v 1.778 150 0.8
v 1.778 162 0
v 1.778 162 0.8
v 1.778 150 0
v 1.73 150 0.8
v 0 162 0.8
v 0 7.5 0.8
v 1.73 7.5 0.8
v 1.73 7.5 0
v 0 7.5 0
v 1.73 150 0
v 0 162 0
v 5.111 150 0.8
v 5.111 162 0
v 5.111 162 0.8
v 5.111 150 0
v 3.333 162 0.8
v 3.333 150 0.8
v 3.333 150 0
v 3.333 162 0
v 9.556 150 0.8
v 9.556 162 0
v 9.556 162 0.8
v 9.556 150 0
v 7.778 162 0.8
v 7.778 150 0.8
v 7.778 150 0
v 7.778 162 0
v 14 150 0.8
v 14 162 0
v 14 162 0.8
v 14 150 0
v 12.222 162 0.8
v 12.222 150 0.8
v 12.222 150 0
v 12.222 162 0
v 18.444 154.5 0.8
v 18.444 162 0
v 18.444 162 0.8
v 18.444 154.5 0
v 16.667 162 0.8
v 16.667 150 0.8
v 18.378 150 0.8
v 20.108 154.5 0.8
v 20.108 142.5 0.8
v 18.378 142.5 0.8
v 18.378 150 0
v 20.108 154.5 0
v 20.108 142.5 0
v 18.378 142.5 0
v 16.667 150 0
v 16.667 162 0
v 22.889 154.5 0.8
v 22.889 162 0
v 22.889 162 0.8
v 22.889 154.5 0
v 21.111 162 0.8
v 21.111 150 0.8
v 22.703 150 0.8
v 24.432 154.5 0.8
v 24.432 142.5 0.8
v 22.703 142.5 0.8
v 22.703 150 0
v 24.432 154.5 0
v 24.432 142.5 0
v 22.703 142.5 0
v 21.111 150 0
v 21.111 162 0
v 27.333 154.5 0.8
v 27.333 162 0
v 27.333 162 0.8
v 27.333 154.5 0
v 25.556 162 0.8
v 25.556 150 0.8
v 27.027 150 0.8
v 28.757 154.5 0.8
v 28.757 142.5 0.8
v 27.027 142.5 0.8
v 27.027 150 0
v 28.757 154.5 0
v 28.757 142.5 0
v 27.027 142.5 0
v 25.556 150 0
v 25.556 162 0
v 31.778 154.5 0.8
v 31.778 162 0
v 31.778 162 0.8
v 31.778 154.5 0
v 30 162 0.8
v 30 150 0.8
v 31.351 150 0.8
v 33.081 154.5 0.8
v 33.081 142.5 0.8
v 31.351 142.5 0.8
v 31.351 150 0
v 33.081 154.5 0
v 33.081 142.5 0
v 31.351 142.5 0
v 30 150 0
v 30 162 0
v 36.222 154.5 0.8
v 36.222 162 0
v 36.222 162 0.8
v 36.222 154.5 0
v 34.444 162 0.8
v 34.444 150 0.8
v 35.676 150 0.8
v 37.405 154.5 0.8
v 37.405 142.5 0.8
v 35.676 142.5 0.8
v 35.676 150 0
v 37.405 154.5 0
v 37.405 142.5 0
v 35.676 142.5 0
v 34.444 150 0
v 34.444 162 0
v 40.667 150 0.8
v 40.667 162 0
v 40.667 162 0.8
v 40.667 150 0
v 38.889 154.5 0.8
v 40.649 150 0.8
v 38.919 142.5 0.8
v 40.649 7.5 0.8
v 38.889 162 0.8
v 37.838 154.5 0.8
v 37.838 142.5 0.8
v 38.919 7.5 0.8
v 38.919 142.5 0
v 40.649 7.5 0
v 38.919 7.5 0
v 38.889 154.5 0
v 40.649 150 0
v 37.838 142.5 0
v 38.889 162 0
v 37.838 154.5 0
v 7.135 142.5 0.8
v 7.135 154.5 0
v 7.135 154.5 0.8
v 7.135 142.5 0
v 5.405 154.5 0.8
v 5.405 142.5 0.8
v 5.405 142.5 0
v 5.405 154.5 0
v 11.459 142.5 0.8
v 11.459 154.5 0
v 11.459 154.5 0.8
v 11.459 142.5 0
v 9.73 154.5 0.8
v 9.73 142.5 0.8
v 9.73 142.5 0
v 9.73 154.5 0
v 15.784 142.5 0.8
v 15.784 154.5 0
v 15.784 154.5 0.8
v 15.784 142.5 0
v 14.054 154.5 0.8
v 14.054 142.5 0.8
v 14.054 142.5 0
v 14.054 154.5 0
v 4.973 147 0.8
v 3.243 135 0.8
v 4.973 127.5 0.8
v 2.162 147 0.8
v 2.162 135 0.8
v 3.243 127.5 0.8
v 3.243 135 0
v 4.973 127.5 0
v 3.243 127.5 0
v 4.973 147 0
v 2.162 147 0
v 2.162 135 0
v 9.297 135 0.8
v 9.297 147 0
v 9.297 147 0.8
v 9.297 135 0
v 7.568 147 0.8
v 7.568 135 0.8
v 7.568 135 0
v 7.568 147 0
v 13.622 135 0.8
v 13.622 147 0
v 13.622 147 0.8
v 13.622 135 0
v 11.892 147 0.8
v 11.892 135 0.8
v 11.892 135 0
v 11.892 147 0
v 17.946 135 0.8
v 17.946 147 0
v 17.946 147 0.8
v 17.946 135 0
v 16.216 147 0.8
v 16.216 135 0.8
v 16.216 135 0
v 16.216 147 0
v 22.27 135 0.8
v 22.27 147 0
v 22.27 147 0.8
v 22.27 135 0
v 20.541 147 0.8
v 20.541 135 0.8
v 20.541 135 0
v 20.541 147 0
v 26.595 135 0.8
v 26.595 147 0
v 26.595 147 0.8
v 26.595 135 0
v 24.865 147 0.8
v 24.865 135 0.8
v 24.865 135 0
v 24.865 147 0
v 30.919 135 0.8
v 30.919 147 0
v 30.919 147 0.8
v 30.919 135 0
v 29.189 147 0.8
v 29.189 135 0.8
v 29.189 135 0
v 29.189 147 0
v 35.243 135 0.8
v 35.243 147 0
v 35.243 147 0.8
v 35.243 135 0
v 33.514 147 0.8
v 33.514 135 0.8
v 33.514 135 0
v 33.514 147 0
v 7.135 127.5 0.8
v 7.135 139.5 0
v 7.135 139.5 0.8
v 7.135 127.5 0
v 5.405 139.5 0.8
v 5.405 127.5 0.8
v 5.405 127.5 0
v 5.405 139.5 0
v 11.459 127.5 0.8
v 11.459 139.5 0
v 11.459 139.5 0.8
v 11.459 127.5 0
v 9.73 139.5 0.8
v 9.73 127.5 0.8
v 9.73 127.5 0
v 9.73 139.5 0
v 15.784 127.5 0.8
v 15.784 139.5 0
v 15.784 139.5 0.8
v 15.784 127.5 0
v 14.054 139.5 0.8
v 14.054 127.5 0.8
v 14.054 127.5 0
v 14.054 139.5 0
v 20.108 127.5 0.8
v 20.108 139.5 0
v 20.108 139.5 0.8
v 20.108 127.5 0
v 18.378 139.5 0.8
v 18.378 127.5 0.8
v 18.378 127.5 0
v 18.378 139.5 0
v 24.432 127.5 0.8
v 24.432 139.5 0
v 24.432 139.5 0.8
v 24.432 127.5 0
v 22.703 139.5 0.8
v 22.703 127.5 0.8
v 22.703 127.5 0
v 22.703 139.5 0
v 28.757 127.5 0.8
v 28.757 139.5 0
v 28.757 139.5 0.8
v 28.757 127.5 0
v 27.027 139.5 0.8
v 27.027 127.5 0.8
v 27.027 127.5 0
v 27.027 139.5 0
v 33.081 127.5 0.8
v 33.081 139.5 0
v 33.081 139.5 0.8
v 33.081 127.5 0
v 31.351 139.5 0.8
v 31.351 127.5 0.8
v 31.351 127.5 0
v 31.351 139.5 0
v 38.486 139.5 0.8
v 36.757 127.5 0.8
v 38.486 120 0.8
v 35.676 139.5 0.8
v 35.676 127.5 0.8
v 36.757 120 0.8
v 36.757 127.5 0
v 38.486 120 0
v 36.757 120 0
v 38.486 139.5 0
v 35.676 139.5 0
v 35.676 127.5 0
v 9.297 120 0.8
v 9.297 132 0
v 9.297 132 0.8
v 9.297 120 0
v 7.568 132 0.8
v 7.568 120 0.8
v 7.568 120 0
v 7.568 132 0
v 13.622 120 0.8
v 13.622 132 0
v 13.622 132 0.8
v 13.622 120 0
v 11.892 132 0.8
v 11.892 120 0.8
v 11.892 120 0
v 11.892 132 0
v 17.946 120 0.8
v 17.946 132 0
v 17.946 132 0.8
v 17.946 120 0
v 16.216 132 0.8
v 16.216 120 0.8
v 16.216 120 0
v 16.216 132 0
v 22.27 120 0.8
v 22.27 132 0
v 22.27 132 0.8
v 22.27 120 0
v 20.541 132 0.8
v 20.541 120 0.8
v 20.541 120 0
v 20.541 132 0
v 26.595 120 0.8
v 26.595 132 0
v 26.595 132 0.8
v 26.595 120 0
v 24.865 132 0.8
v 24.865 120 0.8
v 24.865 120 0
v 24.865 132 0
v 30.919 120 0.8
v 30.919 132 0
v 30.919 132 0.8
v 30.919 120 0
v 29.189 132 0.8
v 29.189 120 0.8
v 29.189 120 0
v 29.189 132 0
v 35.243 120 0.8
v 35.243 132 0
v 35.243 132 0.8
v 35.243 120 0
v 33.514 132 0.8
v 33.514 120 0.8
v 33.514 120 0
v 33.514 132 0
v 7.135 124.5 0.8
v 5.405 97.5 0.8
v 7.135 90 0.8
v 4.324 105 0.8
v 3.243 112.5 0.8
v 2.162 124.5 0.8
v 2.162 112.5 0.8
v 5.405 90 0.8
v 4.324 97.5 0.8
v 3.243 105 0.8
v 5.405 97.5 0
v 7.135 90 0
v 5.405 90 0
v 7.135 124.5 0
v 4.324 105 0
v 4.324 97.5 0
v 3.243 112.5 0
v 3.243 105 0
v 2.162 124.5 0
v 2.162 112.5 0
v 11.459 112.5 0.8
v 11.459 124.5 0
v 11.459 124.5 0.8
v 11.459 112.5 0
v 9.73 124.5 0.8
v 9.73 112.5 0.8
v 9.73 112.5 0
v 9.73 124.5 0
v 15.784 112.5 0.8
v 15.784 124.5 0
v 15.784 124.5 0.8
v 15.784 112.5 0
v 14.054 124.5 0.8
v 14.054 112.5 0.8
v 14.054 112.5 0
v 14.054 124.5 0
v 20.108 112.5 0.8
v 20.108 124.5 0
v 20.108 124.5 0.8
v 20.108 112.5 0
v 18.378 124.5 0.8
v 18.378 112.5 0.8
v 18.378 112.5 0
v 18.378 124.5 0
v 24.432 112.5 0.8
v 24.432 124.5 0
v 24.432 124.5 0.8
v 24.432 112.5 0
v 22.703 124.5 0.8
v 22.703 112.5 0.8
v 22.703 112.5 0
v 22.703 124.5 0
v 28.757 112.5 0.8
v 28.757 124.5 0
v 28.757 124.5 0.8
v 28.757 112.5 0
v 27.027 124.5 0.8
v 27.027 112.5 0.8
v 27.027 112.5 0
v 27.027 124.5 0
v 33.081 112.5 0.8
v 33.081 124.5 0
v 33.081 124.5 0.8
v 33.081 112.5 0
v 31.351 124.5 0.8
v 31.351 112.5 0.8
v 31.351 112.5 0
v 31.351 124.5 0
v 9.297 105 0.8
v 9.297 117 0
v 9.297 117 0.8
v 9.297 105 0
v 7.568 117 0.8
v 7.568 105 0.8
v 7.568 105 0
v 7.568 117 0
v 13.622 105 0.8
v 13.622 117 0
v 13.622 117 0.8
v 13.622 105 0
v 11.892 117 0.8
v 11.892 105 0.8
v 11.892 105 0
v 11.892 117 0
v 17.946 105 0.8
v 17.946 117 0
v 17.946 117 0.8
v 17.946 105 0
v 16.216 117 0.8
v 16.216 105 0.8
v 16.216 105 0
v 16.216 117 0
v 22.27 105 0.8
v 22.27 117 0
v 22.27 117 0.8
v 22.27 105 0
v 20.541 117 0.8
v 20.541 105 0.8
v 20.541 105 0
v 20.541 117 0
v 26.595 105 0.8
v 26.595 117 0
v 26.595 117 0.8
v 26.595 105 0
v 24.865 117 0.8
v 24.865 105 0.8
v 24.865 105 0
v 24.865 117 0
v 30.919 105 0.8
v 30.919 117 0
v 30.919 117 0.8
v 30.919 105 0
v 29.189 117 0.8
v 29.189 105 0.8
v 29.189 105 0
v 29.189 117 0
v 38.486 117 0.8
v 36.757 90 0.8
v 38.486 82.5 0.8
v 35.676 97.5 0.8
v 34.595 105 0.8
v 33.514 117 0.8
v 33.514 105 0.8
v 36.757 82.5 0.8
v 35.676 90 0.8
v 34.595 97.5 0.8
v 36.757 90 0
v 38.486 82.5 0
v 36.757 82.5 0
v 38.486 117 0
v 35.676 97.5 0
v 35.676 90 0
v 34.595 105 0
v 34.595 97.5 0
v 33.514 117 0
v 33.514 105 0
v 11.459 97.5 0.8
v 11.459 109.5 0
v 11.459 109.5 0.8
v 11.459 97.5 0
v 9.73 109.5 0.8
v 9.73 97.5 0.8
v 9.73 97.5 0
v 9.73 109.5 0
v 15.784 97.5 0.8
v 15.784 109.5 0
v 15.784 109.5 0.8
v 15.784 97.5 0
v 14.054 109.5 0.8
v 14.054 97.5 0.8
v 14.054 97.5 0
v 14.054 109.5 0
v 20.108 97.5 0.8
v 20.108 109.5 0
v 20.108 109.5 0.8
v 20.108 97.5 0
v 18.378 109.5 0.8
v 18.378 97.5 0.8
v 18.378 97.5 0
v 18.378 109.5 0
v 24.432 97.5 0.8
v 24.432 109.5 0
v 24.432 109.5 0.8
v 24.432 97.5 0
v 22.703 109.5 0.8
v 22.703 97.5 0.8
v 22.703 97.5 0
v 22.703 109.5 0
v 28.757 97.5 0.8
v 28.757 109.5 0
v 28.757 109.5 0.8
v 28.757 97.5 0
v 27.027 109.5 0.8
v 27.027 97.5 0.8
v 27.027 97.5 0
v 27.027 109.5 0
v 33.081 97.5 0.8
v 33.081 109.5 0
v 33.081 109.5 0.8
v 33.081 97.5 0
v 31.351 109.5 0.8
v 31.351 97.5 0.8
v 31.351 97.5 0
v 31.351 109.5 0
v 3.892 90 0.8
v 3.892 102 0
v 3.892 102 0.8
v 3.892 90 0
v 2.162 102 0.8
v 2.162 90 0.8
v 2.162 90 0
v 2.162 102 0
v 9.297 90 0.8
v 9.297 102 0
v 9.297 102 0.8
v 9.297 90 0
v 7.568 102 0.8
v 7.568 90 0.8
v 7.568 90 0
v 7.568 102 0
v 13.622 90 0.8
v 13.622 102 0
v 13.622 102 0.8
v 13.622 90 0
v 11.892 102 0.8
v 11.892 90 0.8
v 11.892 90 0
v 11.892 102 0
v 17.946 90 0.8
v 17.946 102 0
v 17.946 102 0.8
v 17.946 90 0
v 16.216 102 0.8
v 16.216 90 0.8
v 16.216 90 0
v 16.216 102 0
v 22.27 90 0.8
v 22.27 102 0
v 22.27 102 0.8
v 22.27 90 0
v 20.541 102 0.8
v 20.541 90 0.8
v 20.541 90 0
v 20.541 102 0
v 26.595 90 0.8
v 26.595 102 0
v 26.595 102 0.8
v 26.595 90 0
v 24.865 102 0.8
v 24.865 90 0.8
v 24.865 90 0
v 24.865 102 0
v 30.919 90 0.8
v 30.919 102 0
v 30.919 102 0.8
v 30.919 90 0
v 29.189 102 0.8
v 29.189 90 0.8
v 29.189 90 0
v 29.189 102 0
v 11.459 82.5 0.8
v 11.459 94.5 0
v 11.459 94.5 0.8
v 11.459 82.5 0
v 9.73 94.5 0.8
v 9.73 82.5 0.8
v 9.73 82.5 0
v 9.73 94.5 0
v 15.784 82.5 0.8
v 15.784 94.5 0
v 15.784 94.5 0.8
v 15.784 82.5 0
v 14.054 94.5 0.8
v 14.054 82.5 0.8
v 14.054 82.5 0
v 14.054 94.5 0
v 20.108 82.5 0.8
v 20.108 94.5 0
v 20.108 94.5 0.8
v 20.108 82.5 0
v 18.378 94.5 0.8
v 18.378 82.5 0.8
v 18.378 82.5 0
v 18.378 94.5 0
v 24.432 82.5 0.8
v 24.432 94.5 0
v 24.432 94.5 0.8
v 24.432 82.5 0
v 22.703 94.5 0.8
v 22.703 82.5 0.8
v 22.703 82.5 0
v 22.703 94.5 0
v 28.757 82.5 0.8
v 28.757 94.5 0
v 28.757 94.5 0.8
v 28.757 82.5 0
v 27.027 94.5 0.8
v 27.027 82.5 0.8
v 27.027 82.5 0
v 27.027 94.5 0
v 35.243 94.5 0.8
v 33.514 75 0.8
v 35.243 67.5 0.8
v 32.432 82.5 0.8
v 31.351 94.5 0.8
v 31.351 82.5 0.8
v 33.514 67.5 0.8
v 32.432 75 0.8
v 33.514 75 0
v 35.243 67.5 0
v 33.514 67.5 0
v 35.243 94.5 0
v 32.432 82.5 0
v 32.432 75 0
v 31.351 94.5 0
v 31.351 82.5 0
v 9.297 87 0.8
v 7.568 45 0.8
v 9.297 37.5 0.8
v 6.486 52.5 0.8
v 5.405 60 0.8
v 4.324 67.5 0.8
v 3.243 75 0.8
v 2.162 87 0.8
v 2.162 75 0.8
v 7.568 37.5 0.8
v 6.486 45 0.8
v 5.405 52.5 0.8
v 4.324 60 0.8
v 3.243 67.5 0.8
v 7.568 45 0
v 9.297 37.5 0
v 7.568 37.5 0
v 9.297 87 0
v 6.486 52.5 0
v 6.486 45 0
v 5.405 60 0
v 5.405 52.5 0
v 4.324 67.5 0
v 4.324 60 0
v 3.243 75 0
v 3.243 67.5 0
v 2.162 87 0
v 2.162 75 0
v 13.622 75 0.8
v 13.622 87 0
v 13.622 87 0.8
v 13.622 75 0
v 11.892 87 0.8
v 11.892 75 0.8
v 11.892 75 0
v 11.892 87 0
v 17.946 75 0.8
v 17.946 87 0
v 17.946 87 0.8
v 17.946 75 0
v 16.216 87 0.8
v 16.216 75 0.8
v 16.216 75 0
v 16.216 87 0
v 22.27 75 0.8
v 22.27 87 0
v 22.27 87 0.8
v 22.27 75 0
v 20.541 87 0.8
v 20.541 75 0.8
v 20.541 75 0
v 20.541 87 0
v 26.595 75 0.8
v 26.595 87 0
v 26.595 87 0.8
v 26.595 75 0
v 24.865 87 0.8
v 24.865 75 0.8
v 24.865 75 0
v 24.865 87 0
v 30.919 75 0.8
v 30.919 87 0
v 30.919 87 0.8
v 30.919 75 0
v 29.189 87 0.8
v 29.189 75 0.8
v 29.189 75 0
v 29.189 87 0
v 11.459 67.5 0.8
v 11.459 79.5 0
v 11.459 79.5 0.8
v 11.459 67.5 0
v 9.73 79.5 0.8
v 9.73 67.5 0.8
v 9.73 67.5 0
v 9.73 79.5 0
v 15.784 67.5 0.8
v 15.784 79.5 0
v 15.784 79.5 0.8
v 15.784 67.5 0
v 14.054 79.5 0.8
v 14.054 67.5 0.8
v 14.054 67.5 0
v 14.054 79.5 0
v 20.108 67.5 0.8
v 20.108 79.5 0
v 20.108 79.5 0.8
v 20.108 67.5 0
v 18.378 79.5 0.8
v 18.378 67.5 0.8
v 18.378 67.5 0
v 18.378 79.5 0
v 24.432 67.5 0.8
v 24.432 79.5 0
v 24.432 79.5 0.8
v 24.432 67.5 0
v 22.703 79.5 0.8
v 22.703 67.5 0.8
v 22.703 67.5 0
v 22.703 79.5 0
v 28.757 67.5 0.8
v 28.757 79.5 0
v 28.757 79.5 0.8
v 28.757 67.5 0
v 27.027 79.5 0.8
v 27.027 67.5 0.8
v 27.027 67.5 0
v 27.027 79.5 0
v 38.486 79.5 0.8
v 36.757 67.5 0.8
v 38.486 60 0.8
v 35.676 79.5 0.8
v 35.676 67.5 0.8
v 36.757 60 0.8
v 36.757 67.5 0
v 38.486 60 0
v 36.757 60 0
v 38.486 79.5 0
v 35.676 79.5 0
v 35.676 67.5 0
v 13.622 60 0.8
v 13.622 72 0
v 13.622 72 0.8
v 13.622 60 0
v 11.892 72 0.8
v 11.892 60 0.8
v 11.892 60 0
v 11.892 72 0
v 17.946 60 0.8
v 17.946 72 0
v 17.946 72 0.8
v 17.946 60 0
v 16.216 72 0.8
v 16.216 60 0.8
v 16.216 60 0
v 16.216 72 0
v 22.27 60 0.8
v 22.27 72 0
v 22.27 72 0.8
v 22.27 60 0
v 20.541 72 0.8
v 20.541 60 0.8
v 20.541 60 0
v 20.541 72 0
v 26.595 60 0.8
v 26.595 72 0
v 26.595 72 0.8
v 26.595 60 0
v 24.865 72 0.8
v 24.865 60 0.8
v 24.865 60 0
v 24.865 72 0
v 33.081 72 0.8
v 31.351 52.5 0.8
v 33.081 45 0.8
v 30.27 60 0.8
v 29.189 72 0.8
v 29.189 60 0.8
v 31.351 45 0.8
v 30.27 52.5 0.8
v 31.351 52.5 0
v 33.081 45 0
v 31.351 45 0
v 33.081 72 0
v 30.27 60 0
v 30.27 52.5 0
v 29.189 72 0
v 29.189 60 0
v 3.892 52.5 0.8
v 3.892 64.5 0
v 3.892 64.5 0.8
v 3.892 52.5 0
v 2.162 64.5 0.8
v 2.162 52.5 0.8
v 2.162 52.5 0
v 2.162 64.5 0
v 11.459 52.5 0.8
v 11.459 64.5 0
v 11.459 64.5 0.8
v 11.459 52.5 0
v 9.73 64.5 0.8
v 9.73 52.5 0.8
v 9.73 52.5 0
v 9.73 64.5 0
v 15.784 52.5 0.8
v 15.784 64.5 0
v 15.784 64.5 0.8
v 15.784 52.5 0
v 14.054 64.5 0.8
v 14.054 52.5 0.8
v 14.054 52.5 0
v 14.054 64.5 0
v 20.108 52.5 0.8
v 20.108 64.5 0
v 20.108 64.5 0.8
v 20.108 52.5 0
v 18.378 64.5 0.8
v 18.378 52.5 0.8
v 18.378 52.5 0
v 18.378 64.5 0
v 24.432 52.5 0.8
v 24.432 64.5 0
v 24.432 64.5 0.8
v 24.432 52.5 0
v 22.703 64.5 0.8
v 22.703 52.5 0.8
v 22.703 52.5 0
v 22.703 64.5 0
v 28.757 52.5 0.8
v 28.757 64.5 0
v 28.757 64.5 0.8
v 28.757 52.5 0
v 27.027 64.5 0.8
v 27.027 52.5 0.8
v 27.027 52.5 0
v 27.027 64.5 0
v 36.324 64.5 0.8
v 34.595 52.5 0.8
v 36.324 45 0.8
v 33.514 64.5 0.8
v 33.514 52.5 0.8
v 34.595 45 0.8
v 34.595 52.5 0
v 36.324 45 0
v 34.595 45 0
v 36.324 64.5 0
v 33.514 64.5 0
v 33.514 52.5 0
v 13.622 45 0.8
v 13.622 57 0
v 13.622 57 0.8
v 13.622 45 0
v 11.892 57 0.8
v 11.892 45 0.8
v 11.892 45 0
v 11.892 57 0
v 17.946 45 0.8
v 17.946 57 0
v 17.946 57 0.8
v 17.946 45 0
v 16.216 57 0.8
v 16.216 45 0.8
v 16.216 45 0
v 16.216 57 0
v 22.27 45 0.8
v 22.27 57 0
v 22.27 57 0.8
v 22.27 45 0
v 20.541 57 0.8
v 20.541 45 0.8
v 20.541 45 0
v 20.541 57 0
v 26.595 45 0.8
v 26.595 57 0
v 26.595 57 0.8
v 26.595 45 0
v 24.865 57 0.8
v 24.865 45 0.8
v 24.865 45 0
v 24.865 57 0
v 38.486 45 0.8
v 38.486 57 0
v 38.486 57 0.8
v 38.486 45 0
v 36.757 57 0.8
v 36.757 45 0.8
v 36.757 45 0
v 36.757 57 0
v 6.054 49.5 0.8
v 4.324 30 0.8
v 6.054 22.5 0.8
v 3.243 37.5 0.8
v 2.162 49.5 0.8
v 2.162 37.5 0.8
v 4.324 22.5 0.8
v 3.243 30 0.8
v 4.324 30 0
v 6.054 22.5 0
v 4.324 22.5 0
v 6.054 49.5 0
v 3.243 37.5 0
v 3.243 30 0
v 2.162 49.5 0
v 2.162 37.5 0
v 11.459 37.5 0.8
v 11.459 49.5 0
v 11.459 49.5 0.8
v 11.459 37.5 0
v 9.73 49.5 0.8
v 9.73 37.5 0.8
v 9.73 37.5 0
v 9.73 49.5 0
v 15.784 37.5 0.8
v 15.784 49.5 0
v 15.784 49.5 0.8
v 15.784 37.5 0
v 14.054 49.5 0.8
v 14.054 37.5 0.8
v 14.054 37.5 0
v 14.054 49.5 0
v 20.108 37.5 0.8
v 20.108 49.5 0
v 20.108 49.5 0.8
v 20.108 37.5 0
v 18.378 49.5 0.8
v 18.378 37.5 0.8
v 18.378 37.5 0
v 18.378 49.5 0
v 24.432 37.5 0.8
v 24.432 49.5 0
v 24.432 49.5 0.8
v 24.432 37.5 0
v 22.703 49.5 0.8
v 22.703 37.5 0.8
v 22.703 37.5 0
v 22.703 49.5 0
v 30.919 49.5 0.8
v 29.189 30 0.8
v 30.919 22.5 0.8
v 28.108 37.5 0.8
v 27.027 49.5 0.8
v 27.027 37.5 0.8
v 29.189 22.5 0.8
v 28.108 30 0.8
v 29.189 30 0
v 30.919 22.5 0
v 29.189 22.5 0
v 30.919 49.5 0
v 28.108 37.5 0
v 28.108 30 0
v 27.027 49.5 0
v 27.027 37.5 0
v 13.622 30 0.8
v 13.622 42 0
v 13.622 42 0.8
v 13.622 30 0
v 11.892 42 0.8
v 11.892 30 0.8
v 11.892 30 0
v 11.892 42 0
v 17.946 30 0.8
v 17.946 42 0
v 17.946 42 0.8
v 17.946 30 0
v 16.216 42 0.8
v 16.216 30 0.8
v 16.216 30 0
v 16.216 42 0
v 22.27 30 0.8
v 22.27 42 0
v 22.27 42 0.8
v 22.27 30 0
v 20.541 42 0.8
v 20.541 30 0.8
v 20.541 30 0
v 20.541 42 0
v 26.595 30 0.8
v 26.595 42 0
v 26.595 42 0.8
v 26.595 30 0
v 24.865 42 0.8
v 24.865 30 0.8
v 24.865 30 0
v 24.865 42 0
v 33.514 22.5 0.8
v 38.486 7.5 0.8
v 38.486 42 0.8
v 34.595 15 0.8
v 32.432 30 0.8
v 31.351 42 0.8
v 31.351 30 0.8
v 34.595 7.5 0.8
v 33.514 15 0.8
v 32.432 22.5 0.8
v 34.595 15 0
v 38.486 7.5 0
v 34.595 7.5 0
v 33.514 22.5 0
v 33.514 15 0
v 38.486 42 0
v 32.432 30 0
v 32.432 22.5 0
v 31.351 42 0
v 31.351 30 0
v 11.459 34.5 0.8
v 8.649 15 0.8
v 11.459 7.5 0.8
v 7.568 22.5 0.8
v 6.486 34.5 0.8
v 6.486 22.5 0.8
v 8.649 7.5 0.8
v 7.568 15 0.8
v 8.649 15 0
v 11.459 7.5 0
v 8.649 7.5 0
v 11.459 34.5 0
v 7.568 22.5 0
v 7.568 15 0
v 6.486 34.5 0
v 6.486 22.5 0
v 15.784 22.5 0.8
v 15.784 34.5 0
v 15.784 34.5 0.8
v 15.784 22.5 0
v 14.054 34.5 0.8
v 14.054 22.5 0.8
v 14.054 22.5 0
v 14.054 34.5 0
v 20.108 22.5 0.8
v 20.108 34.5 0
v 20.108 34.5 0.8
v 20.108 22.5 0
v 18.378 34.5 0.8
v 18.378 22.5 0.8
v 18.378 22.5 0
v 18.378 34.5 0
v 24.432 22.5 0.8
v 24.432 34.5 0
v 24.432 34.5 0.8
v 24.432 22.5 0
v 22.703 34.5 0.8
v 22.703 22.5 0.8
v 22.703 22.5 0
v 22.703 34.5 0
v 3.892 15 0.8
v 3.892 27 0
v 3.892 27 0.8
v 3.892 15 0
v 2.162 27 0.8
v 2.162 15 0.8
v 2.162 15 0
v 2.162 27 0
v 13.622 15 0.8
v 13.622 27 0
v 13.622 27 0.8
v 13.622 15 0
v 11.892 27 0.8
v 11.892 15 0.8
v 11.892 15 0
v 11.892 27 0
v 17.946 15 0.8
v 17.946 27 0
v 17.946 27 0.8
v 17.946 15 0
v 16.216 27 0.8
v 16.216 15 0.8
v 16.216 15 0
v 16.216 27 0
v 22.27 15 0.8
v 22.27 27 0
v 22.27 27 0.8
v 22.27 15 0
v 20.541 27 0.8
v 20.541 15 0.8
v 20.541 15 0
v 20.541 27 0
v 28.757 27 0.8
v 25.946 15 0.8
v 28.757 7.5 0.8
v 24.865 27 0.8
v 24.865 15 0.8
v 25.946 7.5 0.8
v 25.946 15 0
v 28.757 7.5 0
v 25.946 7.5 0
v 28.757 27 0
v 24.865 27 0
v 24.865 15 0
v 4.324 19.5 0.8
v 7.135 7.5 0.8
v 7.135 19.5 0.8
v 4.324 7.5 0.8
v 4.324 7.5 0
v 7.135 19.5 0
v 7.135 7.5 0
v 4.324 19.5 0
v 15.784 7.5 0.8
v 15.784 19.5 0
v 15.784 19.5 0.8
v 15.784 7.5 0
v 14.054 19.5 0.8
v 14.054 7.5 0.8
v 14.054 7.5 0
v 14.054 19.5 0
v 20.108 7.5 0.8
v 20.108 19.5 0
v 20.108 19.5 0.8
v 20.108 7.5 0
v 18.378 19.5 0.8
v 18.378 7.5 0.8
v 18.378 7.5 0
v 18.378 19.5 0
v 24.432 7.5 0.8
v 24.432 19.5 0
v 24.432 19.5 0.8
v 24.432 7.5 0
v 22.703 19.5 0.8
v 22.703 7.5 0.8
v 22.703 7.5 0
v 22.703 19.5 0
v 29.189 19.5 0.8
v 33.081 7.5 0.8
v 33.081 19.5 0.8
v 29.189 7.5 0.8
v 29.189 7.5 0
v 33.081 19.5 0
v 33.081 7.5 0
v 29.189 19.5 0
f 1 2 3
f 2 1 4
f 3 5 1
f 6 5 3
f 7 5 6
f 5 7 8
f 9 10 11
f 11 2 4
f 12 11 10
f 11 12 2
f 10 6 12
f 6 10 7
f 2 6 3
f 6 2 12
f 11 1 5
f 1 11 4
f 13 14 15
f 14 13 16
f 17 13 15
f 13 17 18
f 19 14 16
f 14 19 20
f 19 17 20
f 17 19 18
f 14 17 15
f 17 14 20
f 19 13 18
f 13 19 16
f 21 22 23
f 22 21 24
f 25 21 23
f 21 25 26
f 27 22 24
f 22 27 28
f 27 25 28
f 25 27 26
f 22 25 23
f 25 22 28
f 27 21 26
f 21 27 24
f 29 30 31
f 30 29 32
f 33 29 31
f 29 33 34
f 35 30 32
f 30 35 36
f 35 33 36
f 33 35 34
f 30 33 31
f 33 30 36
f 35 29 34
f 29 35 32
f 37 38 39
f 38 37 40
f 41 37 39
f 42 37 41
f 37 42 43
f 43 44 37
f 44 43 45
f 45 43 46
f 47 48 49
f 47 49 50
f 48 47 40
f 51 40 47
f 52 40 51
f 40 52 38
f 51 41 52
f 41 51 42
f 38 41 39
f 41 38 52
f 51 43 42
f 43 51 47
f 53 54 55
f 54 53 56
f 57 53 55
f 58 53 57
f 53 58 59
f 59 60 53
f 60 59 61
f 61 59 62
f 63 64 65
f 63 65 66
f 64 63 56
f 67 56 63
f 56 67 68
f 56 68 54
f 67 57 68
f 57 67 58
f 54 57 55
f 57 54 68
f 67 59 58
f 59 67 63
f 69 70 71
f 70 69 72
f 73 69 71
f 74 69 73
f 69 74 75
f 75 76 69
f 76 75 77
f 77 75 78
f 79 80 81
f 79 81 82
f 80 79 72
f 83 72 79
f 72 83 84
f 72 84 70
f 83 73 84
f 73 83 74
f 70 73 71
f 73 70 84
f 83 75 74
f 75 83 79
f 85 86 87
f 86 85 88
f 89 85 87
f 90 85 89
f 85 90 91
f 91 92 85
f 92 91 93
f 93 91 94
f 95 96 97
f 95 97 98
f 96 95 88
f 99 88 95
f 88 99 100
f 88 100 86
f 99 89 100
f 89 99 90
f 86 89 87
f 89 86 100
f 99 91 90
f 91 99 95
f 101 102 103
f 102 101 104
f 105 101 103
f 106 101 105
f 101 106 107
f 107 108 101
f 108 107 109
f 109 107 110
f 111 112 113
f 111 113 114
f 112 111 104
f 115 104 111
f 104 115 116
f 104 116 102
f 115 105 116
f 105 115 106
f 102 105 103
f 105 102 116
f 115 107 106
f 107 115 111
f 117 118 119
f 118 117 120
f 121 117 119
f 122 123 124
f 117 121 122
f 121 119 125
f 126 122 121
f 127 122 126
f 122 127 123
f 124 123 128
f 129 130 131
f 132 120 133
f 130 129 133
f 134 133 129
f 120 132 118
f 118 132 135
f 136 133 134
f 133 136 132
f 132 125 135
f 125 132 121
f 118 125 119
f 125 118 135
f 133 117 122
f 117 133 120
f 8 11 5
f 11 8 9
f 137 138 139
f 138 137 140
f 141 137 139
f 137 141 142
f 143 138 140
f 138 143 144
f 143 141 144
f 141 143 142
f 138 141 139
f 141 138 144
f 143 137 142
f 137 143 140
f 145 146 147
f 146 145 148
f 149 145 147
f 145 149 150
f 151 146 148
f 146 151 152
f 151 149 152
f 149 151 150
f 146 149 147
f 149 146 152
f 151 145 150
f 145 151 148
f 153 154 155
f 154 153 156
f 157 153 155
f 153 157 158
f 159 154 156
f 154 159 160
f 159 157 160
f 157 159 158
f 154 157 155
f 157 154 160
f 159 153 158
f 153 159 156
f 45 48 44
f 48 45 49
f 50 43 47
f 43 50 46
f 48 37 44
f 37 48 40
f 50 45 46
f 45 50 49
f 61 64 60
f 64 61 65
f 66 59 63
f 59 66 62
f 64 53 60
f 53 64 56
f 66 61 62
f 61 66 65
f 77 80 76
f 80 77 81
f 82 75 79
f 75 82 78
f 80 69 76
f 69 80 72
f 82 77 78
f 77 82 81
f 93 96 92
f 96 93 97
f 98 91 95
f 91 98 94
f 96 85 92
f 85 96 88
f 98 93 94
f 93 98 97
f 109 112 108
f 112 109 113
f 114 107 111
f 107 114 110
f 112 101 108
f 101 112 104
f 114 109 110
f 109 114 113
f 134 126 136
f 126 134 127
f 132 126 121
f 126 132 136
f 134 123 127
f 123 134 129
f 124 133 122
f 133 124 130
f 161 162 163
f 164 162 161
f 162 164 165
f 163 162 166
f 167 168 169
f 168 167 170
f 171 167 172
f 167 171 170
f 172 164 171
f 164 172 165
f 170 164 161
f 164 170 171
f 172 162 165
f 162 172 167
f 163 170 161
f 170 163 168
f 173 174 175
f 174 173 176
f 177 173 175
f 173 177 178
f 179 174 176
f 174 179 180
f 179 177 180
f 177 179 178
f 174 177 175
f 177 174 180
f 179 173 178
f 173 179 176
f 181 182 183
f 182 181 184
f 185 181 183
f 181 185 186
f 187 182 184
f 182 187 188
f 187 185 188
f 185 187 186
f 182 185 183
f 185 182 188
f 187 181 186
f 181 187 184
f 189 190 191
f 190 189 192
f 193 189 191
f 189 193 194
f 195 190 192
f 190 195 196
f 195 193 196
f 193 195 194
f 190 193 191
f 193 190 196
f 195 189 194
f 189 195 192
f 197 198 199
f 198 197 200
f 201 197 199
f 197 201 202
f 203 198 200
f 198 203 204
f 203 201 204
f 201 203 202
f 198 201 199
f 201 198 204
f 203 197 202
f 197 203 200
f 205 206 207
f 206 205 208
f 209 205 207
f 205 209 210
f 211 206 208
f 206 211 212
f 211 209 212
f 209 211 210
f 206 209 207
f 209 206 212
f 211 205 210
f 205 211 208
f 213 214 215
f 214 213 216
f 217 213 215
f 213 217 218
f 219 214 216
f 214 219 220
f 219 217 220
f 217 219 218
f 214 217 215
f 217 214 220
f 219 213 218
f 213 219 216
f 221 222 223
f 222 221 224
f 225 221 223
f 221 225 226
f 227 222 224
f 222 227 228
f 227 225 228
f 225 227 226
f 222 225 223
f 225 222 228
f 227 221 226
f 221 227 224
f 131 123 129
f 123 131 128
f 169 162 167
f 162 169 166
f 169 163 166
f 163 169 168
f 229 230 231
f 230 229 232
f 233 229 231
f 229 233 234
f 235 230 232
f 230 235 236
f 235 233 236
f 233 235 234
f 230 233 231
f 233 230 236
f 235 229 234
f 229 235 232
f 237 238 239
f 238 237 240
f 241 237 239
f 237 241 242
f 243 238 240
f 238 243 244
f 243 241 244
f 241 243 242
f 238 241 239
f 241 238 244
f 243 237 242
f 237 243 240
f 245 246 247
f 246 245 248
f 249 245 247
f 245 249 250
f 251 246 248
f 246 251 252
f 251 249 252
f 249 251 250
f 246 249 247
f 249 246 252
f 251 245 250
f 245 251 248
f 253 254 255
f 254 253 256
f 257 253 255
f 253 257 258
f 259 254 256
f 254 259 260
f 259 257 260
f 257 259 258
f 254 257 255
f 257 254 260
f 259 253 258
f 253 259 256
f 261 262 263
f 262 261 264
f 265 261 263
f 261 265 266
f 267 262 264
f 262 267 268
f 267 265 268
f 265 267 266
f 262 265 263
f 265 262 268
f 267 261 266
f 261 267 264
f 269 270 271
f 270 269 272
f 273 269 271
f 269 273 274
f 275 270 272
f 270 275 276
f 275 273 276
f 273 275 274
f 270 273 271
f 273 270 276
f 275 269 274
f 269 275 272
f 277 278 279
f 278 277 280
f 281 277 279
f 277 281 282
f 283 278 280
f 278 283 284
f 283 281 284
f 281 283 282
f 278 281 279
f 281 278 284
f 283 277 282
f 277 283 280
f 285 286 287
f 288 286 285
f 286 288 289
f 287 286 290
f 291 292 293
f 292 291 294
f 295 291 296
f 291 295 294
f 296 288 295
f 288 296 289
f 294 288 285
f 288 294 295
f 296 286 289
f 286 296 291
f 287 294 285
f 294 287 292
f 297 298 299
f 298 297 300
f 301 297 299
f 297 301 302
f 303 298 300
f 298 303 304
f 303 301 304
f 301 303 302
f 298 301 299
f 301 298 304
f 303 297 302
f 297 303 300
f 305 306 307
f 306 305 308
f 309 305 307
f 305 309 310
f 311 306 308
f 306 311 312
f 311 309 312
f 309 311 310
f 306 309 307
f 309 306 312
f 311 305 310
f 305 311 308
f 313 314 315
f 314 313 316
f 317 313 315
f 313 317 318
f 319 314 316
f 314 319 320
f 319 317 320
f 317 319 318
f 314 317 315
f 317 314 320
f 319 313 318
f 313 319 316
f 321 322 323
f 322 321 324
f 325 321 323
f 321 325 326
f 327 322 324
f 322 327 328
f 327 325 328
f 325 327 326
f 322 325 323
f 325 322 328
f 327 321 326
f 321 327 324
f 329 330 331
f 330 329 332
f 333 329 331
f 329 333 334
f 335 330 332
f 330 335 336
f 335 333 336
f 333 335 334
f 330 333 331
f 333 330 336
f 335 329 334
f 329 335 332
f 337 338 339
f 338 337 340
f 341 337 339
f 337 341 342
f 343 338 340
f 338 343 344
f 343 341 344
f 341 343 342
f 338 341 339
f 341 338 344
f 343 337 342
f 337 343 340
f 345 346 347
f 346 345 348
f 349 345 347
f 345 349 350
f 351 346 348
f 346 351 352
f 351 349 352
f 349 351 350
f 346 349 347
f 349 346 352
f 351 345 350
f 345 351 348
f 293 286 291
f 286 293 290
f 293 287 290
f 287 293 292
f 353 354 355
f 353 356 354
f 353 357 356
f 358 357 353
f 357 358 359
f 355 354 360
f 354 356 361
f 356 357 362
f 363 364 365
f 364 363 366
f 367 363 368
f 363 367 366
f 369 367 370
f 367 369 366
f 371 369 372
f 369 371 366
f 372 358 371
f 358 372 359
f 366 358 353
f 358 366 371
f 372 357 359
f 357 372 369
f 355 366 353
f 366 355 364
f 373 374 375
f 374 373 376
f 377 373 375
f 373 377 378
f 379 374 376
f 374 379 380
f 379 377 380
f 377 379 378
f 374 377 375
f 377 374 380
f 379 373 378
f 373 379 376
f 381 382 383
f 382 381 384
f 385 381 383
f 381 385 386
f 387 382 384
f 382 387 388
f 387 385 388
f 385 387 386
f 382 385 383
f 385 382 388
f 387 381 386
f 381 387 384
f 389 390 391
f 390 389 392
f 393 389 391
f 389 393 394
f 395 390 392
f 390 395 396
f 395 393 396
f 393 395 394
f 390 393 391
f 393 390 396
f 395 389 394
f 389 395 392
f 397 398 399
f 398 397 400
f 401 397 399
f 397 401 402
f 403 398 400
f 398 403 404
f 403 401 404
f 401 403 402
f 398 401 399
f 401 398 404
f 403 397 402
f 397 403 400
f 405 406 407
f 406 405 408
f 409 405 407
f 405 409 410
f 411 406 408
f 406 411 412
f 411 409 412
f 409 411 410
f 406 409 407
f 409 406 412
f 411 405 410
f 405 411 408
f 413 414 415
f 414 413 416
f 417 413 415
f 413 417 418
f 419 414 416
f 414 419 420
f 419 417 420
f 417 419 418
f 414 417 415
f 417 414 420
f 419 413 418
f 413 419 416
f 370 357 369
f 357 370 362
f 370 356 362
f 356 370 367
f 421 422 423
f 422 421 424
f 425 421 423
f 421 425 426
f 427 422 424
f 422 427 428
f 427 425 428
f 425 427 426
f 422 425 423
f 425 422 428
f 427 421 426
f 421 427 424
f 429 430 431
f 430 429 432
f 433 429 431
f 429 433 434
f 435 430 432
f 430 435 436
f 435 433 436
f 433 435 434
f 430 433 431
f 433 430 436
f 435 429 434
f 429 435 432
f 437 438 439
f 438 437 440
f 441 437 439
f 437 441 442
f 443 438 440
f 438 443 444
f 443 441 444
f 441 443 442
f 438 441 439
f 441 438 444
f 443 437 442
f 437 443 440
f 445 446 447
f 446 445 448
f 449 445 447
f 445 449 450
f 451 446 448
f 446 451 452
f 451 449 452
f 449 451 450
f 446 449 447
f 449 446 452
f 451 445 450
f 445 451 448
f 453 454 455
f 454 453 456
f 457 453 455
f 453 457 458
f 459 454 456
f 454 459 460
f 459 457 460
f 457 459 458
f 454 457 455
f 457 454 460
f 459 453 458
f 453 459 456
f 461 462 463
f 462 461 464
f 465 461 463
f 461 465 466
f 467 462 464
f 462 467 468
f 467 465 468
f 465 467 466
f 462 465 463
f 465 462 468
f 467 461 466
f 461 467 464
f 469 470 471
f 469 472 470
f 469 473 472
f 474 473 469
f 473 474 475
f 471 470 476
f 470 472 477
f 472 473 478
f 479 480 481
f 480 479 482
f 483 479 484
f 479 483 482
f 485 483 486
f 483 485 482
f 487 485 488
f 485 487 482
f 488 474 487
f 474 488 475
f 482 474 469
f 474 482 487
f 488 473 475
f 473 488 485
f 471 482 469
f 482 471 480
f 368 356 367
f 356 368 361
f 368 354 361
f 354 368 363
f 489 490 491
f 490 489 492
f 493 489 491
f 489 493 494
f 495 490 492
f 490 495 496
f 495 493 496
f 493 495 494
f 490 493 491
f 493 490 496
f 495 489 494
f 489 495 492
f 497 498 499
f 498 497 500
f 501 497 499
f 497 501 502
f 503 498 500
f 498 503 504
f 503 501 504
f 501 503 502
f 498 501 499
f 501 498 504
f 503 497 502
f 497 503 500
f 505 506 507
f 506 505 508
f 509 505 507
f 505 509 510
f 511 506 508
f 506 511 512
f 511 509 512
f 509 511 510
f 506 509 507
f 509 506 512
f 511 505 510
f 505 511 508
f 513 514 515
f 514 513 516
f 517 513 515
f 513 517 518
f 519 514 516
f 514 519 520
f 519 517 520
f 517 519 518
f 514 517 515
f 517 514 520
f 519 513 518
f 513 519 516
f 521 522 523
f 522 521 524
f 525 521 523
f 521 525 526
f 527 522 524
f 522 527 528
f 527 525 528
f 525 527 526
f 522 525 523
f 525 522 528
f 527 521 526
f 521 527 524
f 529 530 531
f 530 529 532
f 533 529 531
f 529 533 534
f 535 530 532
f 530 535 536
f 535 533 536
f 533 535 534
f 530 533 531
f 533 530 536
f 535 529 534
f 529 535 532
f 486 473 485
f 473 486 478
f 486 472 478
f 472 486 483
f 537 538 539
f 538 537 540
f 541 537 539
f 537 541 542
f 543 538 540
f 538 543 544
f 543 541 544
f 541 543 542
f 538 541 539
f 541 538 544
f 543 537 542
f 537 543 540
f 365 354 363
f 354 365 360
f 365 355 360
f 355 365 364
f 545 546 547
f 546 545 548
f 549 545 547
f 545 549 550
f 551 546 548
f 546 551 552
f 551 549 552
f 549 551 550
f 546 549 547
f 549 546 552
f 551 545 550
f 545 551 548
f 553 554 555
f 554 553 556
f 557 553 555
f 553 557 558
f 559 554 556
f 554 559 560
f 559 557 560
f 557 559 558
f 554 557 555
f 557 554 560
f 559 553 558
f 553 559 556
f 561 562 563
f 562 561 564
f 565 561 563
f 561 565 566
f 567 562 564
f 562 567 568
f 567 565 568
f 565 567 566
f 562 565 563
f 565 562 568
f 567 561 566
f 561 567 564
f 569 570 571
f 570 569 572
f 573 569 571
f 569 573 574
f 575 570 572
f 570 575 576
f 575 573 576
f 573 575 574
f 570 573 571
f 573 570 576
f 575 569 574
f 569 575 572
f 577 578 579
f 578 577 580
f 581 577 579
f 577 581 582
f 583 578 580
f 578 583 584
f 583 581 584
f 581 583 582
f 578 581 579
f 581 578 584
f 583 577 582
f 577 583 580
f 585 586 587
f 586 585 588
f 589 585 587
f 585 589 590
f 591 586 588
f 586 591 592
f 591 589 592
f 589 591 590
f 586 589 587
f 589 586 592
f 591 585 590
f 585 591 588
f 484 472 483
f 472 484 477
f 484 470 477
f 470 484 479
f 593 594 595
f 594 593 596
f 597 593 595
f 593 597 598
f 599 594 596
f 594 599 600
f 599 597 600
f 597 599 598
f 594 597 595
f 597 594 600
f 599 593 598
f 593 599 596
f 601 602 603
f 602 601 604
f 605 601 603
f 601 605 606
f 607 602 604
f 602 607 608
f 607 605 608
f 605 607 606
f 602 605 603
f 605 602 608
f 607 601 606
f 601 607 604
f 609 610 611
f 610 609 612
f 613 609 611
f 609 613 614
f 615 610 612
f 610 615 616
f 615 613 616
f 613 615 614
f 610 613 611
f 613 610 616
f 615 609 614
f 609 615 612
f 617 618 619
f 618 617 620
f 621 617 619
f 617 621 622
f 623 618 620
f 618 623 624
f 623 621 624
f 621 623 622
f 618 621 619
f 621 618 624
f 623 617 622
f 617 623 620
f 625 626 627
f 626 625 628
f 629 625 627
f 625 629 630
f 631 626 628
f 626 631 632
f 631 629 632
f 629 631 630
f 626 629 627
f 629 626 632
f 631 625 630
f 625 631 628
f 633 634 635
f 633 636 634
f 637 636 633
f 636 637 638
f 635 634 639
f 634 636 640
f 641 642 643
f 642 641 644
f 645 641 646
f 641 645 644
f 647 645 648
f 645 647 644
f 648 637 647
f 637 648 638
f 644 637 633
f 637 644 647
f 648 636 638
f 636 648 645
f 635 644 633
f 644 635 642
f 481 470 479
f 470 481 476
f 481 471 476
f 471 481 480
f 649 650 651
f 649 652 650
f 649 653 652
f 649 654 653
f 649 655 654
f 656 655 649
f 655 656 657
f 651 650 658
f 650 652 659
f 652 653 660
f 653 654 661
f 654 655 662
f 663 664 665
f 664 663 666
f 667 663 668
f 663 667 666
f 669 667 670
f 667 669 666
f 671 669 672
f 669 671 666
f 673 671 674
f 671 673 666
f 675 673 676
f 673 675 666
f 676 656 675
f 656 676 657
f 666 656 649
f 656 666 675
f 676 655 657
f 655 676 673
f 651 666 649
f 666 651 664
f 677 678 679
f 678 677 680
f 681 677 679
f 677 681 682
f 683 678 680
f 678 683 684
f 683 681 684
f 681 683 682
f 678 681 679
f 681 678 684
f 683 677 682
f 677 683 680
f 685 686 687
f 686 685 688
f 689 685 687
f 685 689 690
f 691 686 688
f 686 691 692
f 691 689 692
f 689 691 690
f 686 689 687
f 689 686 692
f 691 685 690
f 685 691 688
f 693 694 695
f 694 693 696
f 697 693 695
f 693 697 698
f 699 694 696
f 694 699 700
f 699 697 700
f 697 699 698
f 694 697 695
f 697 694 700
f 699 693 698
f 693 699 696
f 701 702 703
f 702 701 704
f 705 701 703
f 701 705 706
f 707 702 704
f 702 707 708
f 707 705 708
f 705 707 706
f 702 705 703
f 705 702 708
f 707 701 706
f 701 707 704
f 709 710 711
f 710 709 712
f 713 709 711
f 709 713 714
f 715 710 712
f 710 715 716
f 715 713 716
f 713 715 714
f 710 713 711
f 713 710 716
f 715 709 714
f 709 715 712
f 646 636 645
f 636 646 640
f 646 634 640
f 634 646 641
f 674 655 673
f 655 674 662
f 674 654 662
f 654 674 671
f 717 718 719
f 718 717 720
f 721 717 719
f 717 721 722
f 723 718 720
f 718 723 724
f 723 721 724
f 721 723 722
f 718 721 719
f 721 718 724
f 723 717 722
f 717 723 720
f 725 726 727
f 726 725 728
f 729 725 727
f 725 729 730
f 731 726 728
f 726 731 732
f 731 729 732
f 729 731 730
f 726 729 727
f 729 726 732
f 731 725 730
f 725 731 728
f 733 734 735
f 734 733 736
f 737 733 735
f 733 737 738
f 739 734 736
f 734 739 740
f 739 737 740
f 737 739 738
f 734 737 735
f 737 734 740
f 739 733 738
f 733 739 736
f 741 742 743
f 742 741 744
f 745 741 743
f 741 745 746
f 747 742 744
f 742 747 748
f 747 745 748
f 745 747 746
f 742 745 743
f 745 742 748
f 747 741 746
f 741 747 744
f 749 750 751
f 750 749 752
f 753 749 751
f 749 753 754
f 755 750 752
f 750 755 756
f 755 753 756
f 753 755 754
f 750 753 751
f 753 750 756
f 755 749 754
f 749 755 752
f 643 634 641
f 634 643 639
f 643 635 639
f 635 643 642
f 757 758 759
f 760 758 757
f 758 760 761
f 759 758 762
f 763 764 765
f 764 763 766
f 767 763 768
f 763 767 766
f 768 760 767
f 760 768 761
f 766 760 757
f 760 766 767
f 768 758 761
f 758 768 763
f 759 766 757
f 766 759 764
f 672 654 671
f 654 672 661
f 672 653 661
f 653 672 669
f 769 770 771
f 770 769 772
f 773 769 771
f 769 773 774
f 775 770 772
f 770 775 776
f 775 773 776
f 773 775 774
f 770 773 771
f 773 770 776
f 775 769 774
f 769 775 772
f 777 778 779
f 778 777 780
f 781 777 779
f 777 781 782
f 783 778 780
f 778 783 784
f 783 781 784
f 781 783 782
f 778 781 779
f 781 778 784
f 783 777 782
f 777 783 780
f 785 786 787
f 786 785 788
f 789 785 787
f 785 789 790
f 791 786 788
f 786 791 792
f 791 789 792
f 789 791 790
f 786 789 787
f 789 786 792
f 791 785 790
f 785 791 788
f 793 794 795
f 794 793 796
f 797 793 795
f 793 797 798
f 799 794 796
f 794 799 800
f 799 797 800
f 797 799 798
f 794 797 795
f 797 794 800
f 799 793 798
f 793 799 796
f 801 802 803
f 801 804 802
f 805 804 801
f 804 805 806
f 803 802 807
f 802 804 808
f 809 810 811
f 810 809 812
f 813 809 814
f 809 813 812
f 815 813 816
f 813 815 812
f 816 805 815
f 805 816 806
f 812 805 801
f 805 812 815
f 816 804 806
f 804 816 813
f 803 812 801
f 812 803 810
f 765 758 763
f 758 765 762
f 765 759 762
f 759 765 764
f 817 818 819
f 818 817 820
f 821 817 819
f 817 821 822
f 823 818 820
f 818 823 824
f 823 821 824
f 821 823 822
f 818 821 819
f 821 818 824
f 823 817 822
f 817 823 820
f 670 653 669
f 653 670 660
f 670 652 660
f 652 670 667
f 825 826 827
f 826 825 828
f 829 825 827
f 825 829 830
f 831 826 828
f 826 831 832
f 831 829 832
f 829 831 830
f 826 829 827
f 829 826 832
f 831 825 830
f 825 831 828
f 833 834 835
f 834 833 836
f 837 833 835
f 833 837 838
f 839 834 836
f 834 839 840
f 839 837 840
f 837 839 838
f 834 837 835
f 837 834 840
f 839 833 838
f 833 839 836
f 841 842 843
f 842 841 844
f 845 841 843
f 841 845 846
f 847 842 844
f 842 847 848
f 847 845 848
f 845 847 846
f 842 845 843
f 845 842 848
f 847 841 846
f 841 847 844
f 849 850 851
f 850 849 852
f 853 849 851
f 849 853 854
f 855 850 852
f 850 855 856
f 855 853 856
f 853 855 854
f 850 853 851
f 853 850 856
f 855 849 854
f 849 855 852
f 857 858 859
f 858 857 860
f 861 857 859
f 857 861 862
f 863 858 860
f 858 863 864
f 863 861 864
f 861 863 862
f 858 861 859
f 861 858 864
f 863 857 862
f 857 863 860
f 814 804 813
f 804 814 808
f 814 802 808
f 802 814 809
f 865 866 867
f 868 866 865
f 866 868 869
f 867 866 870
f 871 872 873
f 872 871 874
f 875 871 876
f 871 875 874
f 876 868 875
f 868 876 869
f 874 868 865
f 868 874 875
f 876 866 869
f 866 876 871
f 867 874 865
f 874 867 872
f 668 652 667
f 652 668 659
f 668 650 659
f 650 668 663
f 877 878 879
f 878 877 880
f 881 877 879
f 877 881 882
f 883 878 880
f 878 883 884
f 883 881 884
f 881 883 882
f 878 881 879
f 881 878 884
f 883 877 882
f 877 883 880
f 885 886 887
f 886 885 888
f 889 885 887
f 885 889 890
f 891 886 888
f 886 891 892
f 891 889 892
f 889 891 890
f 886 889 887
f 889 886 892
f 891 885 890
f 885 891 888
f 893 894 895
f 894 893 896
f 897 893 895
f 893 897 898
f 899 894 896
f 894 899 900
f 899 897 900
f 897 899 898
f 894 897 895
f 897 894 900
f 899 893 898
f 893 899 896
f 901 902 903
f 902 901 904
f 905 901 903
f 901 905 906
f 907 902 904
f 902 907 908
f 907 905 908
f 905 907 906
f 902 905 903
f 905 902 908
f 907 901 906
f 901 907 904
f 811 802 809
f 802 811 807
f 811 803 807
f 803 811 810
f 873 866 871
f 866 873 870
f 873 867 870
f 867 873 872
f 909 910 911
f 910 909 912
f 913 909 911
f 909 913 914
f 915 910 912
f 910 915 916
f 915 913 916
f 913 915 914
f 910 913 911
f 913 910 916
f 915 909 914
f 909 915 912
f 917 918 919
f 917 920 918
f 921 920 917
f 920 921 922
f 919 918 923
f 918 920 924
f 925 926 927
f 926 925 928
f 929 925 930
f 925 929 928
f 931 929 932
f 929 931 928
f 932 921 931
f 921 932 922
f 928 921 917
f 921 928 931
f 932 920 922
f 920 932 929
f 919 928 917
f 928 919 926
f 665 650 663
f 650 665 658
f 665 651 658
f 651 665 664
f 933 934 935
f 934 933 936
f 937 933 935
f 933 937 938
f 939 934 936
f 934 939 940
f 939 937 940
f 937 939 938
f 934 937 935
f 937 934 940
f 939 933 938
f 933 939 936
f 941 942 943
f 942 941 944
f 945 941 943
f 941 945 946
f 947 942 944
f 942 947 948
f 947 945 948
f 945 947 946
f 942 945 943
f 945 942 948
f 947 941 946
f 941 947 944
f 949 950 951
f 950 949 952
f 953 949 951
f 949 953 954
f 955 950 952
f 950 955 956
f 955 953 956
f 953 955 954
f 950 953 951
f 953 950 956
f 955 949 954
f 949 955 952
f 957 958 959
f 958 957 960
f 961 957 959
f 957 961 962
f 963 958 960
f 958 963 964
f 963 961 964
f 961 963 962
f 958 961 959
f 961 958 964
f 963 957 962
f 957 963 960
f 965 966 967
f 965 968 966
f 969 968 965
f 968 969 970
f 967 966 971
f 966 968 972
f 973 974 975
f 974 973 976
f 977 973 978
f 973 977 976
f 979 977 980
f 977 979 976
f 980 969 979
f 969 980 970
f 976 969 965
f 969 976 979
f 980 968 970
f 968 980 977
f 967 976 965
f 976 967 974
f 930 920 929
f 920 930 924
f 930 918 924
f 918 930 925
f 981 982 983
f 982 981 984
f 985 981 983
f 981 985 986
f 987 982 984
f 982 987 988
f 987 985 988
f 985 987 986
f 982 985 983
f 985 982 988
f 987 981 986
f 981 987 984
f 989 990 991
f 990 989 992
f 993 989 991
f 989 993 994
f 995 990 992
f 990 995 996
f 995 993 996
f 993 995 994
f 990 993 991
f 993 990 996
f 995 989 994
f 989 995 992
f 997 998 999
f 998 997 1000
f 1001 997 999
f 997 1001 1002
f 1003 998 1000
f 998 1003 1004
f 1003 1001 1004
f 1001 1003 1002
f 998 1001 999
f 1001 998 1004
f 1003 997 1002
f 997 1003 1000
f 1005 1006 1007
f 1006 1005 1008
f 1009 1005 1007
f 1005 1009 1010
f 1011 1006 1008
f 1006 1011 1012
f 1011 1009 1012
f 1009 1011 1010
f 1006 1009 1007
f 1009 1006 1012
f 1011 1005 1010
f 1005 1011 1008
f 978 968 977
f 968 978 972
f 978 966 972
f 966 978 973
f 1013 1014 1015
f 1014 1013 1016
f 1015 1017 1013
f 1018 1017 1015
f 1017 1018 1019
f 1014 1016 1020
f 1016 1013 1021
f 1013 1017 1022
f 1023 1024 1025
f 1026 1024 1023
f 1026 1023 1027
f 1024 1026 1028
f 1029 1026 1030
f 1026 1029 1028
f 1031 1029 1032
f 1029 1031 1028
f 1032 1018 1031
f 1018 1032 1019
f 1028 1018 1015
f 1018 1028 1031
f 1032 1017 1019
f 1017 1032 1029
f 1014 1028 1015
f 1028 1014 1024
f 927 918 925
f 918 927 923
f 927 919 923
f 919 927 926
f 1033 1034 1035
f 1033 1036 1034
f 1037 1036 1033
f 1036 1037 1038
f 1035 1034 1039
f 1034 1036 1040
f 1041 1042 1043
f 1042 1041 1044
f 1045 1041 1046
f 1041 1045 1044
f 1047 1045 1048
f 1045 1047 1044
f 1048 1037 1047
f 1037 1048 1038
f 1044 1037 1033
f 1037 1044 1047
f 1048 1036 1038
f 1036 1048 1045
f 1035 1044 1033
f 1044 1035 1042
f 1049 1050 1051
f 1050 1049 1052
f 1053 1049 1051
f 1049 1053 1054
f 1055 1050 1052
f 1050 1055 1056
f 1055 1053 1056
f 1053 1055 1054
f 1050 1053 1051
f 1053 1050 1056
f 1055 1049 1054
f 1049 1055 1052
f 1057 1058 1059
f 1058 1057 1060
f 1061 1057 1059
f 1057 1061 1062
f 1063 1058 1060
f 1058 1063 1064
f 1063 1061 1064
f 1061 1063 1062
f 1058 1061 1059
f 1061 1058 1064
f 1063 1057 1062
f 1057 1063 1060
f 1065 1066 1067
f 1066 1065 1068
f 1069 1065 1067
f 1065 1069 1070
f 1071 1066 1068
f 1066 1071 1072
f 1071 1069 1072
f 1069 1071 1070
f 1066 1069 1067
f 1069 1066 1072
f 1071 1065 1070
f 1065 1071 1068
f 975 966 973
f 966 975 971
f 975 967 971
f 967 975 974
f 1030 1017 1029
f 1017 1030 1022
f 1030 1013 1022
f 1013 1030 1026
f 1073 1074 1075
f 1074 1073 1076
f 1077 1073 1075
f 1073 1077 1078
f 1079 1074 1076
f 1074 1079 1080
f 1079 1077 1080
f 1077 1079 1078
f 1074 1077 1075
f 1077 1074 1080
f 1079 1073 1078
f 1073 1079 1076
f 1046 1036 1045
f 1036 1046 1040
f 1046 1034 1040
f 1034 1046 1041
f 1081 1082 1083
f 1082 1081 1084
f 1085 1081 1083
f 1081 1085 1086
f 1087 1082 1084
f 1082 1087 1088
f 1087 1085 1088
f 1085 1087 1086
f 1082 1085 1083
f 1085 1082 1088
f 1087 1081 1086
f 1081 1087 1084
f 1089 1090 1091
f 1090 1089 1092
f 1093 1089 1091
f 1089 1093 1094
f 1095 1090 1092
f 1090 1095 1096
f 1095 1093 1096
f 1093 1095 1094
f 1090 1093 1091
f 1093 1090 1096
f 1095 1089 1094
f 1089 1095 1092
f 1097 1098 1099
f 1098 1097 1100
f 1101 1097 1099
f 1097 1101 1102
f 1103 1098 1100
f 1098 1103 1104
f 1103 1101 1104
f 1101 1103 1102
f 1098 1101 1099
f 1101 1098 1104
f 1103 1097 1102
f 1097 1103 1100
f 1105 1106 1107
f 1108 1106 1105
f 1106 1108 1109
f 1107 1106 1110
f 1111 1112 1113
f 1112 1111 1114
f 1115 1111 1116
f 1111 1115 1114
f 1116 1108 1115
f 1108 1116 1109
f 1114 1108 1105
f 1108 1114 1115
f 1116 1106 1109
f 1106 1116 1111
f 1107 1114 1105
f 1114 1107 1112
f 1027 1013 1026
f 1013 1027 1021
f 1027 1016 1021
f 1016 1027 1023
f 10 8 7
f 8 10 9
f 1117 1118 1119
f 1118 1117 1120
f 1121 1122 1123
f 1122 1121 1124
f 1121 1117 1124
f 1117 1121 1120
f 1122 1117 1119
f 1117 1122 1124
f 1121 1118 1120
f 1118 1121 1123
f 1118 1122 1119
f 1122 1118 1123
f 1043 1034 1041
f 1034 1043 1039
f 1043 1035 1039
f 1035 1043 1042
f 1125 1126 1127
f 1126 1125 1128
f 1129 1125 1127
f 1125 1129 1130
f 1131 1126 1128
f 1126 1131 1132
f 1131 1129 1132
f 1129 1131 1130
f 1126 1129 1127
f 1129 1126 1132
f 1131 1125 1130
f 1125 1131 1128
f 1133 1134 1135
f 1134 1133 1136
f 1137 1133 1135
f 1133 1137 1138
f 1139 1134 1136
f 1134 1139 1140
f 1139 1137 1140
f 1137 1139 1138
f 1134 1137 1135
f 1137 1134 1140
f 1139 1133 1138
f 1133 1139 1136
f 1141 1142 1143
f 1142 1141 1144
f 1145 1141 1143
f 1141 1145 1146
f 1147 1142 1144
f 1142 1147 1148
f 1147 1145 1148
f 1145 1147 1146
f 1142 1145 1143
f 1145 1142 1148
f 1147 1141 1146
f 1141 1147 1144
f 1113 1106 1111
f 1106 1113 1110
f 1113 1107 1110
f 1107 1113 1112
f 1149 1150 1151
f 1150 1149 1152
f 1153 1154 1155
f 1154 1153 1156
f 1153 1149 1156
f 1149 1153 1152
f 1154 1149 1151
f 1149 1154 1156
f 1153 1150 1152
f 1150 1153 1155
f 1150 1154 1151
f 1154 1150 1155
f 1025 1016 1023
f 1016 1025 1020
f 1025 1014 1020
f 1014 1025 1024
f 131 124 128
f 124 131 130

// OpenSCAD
// Rule, change for different automata. One or zeros only with 8 numbers
regle = [1,0,0,0,0,0,1,1];
// First line, One or zeros with any length
lignedepart =  [1, 0, 0, 1, 0, 0, 0, 1, 0, 0, 0, 1, 0, 0, 0, 1, 0, 0, 0, 1, 0, 0, 0, 1, 0, 0, 0, 1, 0, 0, 0, 1, 0, 0, 0, 1];
//lignedepart = [1,1,0,0,1,0,0,1,0,1,0,1,1,1,0,1,0,1,1,0,0,1,0,1,0,1,0,0,1,0,0,1,0,1];
//lignedepart = [0,0,0,0,1,0,0,1,0,1,1,1,1,1,0,1,0,1,1,0,0,1,0,1,0,1,0,0,0,1,0,1,0,1,0,1,0,0,0,1,0,1,0,0,1,0,0,1,1,1,0,1,0,1,1,1,0];
//lignedepart = [1,0,1,1,1,1,0,1,0,1,0,1,1,1,0,1,0,1,1,1,1,1,0,1,0,1,0,0,0,1,0,1,0,1];
//lignedepart = [0, 1, 1, 0, 1, 1, 0, 1, 1, 1, 1, 1, 1, 0, 1, 1, 1, 0, 1, 1, 1, 1, 1, 1, 1, 0, 1, 0, 0, 1, 0, 1, 1, 0, 1, 1, 1, 0, 1, 1, 0, 1, 1, 1, 0, 0, 0, 0, 0, 1, 0];

// Bookmark width
largeursignet = 40;
// Bookmark height
longueursignet = 150 ;
// Bookmark thickness
epaisseursignet = .8;
// Number of iterations (higher number takes longer to process !)
nbriterations = 20;
// Overlapping
enchevretrement = 1.6;
// Underlayer thickness
epaisseursouscouche =.2;
// If true, displays the underlayer
avecsouscouche = false;
/* [Hidden] */
hauteurbloc = longueursignet / nbriterations ;
limitelargeur =len(lignedepart);

module afficheligne(uneligne,hauteur=0)
{
largeurbloc = largeursignet / len(uneligne);
for (i = [0:len(uneligne)]){
    if(uneligne[i]== 1)  translate([i*largeurbloc,hauteur*hauteurbloc,0]) cube([largeurbloc*enchevretrement,hauteurbloc*enchevretrement,epaisseursignet]);
    }    
}
//afficheligne(lignedepart,1);

module afficheautomate(n,derniereligne){
        if(n>0){
            //ligneactuelle = [ for (i = [ 1 : len(derniereligne) ]) 
            //i%2==0 ? 1 : i==1 ? 1 :0 ] ;
            ligneactuelle = [ for (i = [ 0 : limitelargeur ]) 
            derniereligne[i-1]==0 && derniereligne[i]==0 && derniereligne[i+1]==0 ? regle[0] : derniereligne[i-1]==0 && derniereligne[i]==0 && derniereligne[i+1]==1 ? regle[1] : derniereligne[i-1]==0 && derniereligne[i]==1 && derniereligne[i+1]==0 ? regle[2]:  derniereligne[i-1]==0 && derniereligne[i]==1 && derniereligne[i+1]==1 ? regle[3] : derniereligne[i-1]==1 && derniereligne[i]==0 && derniereligne[i+1]==0 ? regle[4] : derniereligne[i-1]==1 && derniereligne[i]==0 && derniereligne[i+1]==1 ? regle[5]: derniereligne[i-1]==1 && derniereligne[i]==1 && derniereligne[i+1]==0 ? regle[6]: derniereligne[i-1]==1 && derniereligne[i]==1 && derniereligne[i+1]==1 ? regle[7]: regle[7]];
            /*for(i = [0:len(derniereligne)]) {
                if(i==0){
                ligneactuelle[i]=1;    
                }
                else if(i==len(derniereligne))
                {
                ligneactuelle[i]=1;    
        
                }
                else
                {
                ligneactuelle[i]=1;    

                }
                    
                
            }*/
        afficheligne(derniereligne,n);
        afficheautomate(n-1,ligneactuelle);    
            
        }
        else
            echo(derniereligne);
    
    }
    
    afficheautomate(nbriterations,lignedepart);
    if(avecsouscouche)cube([largeursignet,longueursignet,epaisseursouscouche]);
	//translate([0,0,3]) cylinder(r=rayon+8,h=7);
